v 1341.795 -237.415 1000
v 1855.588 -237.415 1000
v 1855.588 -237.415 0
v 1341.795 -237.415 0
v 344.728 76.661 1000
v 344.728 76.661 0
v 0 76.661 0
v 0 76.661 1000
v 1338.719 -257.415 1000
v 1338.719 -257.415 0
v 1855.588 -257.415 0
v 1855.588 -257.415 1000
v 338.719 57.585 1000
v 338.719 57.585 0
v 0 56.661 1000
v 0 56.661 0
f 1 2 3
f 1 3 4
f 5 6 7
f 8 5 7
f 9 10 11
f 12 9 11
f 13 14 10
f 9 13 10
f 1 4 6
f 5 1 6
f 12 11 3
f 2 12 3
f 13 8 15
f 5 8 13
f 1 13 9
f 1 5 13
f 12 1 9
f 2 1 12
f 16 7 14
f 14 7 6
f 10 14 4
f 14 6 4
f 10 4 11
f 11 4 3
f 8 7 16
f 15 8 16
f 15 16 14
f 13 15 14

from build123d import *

# Parameters (mm, degrees)
BOSS_EXTRUDE1_DEPTH = 1000


with BuildPart() as part:
    # Sketch1 → Boss-Extrude1 (new body)
    with BuildSketch(Plane.XY):
        Polygon((0, 76.661083739), (0, 56.661083739), (338.719471809, 57.585110825), (1338.719471809, -257.414889175), (1338.719471809, -237.414889175), (1341.794983957, -237.414889175), (344.728403277, 76.661083739), align=None)
        Polygon((1338.719471809, -237.414889175), (1338.719471809, -257.414889175), (1405.287047449, -257.414889175), (1341.794983957, -237.414889175), align=None)
        Polygon((1855.588314329, -237.414889175), (1341.794983957, -237.414889175), (1405.287047449, -257.414889175), (1855.588314329, -257.414889175), align=None)
    extrude(amount=BOSS_EXTRUDE1_DEPTH)


solid = part.part
